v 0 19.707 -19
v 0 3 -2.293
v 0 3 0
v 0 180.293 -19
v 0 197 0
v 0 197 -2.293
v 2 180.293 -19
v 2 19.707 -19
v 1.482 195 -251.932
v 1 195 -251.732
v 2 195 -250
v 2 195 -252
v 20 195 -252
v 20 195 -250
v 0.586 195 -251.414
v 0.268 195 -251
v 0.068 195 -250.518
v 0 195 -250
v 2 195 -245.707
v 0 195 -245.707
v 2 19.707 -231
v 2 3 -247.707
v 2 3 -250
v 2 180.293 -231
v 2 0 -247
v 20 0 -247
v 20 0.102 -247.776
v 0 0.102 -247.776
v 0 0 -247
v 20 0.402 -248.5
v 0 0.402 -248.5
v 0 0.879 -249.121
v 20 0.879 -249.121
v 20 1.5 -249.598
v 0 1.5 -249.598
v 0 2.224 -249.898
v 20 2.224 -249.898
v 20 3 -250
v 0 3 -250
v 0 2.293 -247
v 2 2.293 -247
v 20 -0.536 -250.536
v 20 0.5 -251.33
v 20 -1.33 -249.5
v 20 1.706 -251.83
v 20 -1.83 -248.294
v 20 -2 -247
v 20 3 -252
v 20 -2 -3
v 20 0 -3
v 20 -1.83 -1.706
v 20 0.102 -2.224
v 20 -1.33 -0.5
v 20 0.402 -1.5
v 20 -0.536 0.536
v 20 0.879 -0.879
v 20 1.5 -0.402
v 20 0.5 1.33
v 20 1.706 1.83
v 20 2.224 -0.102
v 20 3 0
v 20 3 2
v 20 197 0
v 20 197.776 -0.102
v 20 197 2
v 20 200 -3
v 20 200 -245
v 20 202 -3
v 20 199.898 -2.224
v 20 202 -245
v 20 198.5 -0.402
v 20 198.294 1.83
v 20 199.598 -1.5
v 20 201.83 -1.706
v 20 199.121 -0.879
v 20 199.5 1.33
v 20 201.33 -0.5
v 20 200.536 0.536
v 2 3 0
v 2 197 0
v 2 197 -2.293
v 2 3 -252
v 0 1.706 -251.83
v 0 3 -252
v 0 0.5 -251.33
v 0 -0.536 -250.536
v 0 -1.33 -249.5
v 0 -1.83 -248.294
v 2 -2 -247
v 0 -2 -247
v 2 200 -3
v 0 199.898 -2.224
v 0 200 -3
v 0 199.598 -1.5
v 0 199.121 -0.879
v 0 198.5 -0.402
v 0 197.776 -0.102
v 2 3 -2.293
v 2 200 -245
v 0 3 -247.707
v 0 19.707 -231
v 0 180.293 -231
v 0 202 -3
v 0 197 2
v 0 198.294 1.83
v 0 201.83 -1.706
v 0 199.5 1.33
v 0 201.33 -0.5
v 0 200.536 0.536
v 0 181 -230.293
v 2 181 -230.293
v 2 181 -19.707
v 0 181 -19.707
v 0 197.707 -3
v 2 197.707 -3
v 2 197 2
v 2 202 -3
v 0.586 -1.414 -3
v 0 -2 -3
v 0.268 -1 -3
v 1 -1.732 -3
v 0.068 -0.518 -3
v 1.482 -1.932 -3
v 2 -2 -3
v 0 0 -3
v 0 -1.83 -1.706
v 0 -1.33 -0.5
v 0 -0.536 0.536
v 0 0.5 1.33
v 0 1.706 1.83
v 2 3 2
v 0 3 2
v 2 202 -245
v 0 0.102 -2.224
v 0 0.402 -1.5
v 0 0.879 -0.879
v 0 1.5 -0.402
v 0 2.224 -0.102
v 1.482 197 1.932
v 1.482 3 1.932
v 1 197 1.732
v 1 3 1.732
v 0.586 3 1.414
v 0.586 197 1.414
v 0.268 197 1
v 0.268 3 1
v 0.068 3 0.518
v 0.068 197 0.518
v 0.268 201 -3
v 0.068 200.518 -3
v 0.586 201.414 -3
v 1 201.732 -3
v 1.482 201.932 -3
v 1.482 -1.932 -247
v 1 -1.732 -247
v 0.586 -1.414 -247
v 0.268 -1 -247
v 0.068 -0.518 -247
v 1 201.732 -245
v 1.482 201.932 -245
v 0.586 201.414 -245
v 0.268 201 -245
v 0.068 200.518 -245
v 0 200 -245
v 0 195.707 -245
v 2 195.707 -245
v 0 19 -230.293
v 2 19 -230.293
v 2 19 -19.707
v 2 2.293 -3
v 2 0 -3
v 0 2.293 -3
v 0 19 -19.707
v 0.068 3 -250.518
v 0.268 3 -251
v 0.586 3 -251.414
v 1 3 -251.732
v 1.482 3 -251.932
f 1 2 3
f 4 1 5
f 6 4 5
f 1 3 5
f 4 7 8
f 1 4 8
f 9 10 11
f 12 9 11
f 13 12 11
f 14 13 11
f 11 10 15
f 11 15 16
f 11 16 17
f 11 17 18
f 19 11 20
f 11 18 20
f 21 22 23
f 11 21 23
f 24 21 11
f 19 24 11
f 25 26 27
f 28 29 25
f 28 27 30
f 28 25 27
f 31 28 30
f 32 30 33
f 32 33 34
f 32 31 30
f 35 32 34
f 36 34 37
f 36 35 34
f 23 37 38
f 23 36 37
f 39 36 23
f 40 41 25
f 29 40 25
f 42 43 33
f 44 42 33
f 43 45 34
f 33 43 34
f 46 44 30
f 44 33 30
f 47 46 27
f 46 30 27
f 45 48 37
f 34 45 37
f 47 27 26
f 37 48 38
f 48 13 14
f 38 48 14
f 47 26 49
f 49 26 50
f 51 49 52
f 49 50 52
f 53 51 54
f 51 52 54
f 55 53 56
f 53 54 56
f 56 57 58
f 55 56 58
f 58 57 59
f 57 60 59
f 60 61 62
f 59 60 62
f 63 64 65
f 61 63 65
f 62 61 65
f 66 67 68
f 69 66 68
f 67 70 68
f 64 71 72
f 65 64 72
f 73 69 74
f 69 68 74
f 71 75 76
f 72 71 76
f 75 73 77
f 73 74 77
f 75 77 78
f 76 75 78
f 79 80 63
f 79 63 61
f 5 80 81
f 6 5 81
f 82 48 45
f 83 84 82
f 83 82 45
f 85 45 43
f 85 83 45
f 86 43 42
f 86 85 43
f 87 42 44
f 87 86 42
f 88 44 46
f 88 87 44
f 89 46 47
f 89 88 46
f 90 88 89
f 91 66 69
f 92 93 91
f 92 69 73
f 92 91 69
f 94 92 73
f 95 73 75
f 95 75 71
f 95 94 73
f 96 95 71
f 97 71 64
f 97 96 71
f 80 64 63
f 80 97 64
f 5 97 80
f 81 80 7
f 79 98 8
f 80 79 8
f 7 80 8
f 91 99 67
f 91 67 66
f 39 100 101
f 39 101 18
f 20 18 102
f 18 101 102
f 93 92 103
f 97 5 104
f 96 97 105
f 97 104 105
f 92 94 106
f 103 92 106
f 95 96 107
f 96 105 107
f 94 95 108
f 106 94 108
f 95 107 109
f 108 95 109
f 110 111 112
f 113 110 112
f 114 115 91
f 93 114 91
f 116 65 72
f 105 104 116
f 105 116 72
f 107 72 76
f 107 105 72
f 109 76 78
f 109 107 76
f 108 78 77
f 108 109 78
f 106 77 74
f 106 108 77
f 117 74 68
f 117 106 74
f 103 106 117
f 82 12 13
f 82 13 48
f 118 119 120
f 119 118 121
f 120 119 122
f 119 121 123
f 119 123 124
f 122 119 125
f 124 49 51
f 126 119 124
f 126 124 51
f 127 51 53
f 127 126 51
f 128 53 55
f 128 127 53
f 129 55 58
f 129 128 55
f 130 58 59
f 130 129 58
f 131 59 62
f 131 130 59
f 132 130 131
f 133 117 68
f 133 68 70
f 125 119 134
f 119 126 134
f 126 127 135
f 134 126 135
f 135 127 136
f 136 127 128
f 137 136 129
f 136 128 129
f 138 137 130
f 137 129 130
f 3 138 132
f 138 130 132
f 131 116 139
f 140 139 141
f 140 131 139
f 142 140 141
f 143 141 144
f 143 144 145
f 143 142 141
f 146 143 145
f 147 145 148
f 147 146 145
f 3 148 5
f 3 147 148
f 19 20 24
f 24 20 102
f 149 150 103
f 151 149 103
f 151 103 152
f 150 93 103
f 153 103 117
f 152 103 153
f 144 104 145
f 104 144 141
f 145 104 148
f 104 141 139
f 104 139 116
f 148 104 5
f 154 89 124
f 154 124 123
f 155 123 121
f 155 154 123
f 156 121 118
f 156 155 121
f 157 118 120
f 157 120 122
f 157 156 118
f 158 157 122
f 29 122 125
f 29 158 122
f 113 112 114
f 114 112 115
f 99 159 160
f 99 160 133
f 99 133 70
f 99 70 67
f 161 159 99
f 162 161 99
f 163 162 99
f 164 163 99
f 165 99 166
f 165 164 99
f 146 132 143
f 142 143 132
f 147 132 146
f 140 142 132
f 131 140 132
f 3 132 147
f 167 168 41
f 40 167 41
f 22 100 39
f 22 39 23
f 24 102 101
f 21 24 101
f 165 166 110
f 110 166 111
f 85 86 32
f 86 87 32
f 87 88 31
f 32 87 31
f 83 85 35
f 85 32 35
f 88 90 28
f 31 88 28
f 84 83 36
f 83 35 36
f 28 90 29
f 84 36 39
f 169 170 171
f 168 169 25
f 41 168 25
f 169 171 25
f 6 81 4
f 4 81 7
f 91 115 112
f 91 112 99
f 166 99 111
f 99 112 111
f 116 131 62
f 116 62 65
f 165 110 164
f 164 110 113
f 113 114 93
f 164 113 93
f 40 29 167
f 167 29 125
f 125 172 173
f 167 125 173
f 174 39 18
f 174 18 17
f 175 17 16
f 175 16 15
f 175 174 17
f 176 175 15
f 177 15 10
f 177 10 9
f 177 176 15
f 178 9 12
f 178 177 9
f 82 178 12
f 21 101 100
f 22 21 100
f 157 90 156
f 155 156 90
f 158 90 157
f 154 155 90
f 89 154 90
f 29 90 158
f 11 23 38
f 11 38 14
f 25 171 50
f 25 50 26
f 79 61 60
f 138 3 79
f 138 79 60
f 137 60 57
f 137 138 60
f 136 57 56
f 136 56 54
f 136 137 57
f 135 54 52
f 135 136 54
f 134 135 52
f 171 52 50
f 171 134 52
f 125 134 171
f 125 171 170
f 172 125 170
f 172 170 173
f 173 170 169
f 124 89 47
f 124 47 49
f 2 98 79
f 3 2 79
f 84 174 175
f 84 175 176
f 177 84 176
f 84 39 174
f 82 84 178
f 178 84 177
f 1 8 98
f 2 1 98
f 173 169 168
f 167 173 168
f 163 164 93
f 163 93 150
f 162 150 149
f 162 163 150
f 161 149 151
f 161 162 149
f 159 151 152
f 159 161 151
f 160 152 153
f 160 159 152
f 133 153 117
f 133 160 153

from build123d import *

# Parameters (mm, degrees)
BASE_FLANGE1_DEPTH       = 20
EDGE_FLANGE1_START       = -2
EDGE_FLANGE1_DEPTH       = 2
EDGE_FLANGE1_START_2     = -250
EDGE_FLANGE1_2_OUTLINE_W = 2
EDGE_FLANGE1_2_OUTLINE_H = 192
EDGE_FLANGE1_2_DEPTH     = 2.292893219
EDGE_FLANGE1_3_DEPTH     = 2
EDGE_FLANGE1_START_3     = -247
EDGE_FLANGE1_4_DEPTH     = 244
EDGE_FLANGE1_START_4     = 3
EDGE_FLANGE1_5_DEPTH     = 194


with BuildPart() as part:
    # Base-Flange1: sheet metal written as solids
    # Sketch1 → Base-Flange1 (new body)
    with BuildSketch(Plane(origin=(0, 0, 0), x_dir=(0, 0, -1), z_dir=(1, 0, 0))):
        with BuildLine():
            Line((245, 200), (3, 200))
            ThreePointArc((3, 200), (0.878679656, 199.121320344), (0, 197))
            Line((0, 197), (0, 3))
            ThreePointArc((0, 3), (0.878679656, 0.878679656), (3, 0))
            Line((3, 0), (247, 0))
            ThreePointArc((247, 0), (249.121320344, 0.878679656), (250, 3))
            Line((250, 3), (250, 195))
            Line((250, 195), (252, 195))
            Line((252, 195), (252, 3))
            ThreePointArc((252, 3), (250.535533906, -0.535533906), (247, -2))
            Line((247, -2), (3, -2))
            ThreePointArc((3, -2), (-0.535533906, -0.535533906), (-2, 3))
            Line((-2, 3), (-2, 197))
            ThreePointArc((-2, 197), (-0.535533906, 200.535533906), (3, 202))
            Line((3, 202), (245, 202))
            Line((245, 202), (245, 200))
        make_face()
    extrude(amount=BASE_FLANGE1_DEPTH)

    # Edge-Flange1: read off the stored shape, not the designer's step
    # Edge-Flange1 outline → Edge-Flange1 (add)
    with BuildSketch(Plane(origin=(0, 200, 0), x_dir=(0, 0, -1), z_dir=(-1, 0, 0)).offset(EDGE_FLANGE1_START)):
        Polygon((247, 197.707106781), (247, 200), (3, 200), (3, 197.707106781), (19.707106781, 181), (230.292893219, 181), align=None)
        Polygon((2.292893219, 197), (0, 197), (0, 3), (2.292893219, 3), (19, 19.707106781), (19, 180.292893219), align=None)
        Polygon((245, 0), (245, 4.292893219), (230.292893219, 19), (19.707106781, 19), (3, 2.292893219), (3, 0), align=None)
    extrude(amount=EDGE_FLANGE1_DEPTH)

    # Edge-Flange1 2 outline → Edge-Flange1 2 (add)
    with BuildSketch(Plane.XY.offset(EDGE_FLANGE1_START_2)):
        with Locations((1, 99)):
            Rectangle(EDGE_FLANGE1_2_OUTLINE_W, EDGE_FLANGE1_2_OUTLINE_H)
    extrude(amount=EDGE_FLANGE1_2_DEPTH)

    # Edge-Flange1 3 outline → Edge-Flange1 3 (add)
    with BuildSketch(Plane.YZ):
        Polygon((180.292893219, -231), (19.707106781, -231), (3, -247.707106781), (195, -247.707106781), (195, -245.707106781), align=None)
    extrude(amount=EDGE_FLANGE1_3_DEPTH)

    # Edge-Flange1 4 outline → Edge-Flange1 4 (cut)
    with BuildSketch(Plane.XY.offset(EDGE_FLANGE1_START_3)):
        with BuildLine():
            Line((0, -2), (2, -2))
            ThreePointArc((2, -2), (0.585786438, -1.414213562), (0, 0))
            Line((0, 0), (0, -2))
        make_face()
        with BuildLine():
            Line((0, 202), (0, 200))
            ThreePointArc((0, 200), (0.585786438, 201.414213562), (2, 202))
            Line((2, 202), (0, 202))
        make_face()
    extrude(amount=EDGE_FLANGE1_4_DEPTH, mode=Mode.SUBTRACT)

    # Edge-Flange1 5 outline → Edge-Flange1 5 (cut)
    with BuildSketch(Plane(origin=(0, 0, 0), x_dir=(1, 0, 0), z_dir=(0, 1, 0)).offset(EDGE_FLANGE1_START_4)):
        with BuildLine():
            Line((0, -2), (2, -2))
            ThreePointArc((2, -2), (0.585786438, -1.414213562), (0, 0))
            Line((0, 0), (0, -2))
        make_face()
        with BuildLine():
            Line((0, 252), (0, 250))
            ThreePointArc((0, 250), (0.585786438, 251.414213562), (2, 252))
            Line((2, 252), (0, 252))
        make_face()
    extrude(amount=EDGE_FLANGE1_5_DEPTH, mode=Mode.SUBTRACT)


solid = part.part
